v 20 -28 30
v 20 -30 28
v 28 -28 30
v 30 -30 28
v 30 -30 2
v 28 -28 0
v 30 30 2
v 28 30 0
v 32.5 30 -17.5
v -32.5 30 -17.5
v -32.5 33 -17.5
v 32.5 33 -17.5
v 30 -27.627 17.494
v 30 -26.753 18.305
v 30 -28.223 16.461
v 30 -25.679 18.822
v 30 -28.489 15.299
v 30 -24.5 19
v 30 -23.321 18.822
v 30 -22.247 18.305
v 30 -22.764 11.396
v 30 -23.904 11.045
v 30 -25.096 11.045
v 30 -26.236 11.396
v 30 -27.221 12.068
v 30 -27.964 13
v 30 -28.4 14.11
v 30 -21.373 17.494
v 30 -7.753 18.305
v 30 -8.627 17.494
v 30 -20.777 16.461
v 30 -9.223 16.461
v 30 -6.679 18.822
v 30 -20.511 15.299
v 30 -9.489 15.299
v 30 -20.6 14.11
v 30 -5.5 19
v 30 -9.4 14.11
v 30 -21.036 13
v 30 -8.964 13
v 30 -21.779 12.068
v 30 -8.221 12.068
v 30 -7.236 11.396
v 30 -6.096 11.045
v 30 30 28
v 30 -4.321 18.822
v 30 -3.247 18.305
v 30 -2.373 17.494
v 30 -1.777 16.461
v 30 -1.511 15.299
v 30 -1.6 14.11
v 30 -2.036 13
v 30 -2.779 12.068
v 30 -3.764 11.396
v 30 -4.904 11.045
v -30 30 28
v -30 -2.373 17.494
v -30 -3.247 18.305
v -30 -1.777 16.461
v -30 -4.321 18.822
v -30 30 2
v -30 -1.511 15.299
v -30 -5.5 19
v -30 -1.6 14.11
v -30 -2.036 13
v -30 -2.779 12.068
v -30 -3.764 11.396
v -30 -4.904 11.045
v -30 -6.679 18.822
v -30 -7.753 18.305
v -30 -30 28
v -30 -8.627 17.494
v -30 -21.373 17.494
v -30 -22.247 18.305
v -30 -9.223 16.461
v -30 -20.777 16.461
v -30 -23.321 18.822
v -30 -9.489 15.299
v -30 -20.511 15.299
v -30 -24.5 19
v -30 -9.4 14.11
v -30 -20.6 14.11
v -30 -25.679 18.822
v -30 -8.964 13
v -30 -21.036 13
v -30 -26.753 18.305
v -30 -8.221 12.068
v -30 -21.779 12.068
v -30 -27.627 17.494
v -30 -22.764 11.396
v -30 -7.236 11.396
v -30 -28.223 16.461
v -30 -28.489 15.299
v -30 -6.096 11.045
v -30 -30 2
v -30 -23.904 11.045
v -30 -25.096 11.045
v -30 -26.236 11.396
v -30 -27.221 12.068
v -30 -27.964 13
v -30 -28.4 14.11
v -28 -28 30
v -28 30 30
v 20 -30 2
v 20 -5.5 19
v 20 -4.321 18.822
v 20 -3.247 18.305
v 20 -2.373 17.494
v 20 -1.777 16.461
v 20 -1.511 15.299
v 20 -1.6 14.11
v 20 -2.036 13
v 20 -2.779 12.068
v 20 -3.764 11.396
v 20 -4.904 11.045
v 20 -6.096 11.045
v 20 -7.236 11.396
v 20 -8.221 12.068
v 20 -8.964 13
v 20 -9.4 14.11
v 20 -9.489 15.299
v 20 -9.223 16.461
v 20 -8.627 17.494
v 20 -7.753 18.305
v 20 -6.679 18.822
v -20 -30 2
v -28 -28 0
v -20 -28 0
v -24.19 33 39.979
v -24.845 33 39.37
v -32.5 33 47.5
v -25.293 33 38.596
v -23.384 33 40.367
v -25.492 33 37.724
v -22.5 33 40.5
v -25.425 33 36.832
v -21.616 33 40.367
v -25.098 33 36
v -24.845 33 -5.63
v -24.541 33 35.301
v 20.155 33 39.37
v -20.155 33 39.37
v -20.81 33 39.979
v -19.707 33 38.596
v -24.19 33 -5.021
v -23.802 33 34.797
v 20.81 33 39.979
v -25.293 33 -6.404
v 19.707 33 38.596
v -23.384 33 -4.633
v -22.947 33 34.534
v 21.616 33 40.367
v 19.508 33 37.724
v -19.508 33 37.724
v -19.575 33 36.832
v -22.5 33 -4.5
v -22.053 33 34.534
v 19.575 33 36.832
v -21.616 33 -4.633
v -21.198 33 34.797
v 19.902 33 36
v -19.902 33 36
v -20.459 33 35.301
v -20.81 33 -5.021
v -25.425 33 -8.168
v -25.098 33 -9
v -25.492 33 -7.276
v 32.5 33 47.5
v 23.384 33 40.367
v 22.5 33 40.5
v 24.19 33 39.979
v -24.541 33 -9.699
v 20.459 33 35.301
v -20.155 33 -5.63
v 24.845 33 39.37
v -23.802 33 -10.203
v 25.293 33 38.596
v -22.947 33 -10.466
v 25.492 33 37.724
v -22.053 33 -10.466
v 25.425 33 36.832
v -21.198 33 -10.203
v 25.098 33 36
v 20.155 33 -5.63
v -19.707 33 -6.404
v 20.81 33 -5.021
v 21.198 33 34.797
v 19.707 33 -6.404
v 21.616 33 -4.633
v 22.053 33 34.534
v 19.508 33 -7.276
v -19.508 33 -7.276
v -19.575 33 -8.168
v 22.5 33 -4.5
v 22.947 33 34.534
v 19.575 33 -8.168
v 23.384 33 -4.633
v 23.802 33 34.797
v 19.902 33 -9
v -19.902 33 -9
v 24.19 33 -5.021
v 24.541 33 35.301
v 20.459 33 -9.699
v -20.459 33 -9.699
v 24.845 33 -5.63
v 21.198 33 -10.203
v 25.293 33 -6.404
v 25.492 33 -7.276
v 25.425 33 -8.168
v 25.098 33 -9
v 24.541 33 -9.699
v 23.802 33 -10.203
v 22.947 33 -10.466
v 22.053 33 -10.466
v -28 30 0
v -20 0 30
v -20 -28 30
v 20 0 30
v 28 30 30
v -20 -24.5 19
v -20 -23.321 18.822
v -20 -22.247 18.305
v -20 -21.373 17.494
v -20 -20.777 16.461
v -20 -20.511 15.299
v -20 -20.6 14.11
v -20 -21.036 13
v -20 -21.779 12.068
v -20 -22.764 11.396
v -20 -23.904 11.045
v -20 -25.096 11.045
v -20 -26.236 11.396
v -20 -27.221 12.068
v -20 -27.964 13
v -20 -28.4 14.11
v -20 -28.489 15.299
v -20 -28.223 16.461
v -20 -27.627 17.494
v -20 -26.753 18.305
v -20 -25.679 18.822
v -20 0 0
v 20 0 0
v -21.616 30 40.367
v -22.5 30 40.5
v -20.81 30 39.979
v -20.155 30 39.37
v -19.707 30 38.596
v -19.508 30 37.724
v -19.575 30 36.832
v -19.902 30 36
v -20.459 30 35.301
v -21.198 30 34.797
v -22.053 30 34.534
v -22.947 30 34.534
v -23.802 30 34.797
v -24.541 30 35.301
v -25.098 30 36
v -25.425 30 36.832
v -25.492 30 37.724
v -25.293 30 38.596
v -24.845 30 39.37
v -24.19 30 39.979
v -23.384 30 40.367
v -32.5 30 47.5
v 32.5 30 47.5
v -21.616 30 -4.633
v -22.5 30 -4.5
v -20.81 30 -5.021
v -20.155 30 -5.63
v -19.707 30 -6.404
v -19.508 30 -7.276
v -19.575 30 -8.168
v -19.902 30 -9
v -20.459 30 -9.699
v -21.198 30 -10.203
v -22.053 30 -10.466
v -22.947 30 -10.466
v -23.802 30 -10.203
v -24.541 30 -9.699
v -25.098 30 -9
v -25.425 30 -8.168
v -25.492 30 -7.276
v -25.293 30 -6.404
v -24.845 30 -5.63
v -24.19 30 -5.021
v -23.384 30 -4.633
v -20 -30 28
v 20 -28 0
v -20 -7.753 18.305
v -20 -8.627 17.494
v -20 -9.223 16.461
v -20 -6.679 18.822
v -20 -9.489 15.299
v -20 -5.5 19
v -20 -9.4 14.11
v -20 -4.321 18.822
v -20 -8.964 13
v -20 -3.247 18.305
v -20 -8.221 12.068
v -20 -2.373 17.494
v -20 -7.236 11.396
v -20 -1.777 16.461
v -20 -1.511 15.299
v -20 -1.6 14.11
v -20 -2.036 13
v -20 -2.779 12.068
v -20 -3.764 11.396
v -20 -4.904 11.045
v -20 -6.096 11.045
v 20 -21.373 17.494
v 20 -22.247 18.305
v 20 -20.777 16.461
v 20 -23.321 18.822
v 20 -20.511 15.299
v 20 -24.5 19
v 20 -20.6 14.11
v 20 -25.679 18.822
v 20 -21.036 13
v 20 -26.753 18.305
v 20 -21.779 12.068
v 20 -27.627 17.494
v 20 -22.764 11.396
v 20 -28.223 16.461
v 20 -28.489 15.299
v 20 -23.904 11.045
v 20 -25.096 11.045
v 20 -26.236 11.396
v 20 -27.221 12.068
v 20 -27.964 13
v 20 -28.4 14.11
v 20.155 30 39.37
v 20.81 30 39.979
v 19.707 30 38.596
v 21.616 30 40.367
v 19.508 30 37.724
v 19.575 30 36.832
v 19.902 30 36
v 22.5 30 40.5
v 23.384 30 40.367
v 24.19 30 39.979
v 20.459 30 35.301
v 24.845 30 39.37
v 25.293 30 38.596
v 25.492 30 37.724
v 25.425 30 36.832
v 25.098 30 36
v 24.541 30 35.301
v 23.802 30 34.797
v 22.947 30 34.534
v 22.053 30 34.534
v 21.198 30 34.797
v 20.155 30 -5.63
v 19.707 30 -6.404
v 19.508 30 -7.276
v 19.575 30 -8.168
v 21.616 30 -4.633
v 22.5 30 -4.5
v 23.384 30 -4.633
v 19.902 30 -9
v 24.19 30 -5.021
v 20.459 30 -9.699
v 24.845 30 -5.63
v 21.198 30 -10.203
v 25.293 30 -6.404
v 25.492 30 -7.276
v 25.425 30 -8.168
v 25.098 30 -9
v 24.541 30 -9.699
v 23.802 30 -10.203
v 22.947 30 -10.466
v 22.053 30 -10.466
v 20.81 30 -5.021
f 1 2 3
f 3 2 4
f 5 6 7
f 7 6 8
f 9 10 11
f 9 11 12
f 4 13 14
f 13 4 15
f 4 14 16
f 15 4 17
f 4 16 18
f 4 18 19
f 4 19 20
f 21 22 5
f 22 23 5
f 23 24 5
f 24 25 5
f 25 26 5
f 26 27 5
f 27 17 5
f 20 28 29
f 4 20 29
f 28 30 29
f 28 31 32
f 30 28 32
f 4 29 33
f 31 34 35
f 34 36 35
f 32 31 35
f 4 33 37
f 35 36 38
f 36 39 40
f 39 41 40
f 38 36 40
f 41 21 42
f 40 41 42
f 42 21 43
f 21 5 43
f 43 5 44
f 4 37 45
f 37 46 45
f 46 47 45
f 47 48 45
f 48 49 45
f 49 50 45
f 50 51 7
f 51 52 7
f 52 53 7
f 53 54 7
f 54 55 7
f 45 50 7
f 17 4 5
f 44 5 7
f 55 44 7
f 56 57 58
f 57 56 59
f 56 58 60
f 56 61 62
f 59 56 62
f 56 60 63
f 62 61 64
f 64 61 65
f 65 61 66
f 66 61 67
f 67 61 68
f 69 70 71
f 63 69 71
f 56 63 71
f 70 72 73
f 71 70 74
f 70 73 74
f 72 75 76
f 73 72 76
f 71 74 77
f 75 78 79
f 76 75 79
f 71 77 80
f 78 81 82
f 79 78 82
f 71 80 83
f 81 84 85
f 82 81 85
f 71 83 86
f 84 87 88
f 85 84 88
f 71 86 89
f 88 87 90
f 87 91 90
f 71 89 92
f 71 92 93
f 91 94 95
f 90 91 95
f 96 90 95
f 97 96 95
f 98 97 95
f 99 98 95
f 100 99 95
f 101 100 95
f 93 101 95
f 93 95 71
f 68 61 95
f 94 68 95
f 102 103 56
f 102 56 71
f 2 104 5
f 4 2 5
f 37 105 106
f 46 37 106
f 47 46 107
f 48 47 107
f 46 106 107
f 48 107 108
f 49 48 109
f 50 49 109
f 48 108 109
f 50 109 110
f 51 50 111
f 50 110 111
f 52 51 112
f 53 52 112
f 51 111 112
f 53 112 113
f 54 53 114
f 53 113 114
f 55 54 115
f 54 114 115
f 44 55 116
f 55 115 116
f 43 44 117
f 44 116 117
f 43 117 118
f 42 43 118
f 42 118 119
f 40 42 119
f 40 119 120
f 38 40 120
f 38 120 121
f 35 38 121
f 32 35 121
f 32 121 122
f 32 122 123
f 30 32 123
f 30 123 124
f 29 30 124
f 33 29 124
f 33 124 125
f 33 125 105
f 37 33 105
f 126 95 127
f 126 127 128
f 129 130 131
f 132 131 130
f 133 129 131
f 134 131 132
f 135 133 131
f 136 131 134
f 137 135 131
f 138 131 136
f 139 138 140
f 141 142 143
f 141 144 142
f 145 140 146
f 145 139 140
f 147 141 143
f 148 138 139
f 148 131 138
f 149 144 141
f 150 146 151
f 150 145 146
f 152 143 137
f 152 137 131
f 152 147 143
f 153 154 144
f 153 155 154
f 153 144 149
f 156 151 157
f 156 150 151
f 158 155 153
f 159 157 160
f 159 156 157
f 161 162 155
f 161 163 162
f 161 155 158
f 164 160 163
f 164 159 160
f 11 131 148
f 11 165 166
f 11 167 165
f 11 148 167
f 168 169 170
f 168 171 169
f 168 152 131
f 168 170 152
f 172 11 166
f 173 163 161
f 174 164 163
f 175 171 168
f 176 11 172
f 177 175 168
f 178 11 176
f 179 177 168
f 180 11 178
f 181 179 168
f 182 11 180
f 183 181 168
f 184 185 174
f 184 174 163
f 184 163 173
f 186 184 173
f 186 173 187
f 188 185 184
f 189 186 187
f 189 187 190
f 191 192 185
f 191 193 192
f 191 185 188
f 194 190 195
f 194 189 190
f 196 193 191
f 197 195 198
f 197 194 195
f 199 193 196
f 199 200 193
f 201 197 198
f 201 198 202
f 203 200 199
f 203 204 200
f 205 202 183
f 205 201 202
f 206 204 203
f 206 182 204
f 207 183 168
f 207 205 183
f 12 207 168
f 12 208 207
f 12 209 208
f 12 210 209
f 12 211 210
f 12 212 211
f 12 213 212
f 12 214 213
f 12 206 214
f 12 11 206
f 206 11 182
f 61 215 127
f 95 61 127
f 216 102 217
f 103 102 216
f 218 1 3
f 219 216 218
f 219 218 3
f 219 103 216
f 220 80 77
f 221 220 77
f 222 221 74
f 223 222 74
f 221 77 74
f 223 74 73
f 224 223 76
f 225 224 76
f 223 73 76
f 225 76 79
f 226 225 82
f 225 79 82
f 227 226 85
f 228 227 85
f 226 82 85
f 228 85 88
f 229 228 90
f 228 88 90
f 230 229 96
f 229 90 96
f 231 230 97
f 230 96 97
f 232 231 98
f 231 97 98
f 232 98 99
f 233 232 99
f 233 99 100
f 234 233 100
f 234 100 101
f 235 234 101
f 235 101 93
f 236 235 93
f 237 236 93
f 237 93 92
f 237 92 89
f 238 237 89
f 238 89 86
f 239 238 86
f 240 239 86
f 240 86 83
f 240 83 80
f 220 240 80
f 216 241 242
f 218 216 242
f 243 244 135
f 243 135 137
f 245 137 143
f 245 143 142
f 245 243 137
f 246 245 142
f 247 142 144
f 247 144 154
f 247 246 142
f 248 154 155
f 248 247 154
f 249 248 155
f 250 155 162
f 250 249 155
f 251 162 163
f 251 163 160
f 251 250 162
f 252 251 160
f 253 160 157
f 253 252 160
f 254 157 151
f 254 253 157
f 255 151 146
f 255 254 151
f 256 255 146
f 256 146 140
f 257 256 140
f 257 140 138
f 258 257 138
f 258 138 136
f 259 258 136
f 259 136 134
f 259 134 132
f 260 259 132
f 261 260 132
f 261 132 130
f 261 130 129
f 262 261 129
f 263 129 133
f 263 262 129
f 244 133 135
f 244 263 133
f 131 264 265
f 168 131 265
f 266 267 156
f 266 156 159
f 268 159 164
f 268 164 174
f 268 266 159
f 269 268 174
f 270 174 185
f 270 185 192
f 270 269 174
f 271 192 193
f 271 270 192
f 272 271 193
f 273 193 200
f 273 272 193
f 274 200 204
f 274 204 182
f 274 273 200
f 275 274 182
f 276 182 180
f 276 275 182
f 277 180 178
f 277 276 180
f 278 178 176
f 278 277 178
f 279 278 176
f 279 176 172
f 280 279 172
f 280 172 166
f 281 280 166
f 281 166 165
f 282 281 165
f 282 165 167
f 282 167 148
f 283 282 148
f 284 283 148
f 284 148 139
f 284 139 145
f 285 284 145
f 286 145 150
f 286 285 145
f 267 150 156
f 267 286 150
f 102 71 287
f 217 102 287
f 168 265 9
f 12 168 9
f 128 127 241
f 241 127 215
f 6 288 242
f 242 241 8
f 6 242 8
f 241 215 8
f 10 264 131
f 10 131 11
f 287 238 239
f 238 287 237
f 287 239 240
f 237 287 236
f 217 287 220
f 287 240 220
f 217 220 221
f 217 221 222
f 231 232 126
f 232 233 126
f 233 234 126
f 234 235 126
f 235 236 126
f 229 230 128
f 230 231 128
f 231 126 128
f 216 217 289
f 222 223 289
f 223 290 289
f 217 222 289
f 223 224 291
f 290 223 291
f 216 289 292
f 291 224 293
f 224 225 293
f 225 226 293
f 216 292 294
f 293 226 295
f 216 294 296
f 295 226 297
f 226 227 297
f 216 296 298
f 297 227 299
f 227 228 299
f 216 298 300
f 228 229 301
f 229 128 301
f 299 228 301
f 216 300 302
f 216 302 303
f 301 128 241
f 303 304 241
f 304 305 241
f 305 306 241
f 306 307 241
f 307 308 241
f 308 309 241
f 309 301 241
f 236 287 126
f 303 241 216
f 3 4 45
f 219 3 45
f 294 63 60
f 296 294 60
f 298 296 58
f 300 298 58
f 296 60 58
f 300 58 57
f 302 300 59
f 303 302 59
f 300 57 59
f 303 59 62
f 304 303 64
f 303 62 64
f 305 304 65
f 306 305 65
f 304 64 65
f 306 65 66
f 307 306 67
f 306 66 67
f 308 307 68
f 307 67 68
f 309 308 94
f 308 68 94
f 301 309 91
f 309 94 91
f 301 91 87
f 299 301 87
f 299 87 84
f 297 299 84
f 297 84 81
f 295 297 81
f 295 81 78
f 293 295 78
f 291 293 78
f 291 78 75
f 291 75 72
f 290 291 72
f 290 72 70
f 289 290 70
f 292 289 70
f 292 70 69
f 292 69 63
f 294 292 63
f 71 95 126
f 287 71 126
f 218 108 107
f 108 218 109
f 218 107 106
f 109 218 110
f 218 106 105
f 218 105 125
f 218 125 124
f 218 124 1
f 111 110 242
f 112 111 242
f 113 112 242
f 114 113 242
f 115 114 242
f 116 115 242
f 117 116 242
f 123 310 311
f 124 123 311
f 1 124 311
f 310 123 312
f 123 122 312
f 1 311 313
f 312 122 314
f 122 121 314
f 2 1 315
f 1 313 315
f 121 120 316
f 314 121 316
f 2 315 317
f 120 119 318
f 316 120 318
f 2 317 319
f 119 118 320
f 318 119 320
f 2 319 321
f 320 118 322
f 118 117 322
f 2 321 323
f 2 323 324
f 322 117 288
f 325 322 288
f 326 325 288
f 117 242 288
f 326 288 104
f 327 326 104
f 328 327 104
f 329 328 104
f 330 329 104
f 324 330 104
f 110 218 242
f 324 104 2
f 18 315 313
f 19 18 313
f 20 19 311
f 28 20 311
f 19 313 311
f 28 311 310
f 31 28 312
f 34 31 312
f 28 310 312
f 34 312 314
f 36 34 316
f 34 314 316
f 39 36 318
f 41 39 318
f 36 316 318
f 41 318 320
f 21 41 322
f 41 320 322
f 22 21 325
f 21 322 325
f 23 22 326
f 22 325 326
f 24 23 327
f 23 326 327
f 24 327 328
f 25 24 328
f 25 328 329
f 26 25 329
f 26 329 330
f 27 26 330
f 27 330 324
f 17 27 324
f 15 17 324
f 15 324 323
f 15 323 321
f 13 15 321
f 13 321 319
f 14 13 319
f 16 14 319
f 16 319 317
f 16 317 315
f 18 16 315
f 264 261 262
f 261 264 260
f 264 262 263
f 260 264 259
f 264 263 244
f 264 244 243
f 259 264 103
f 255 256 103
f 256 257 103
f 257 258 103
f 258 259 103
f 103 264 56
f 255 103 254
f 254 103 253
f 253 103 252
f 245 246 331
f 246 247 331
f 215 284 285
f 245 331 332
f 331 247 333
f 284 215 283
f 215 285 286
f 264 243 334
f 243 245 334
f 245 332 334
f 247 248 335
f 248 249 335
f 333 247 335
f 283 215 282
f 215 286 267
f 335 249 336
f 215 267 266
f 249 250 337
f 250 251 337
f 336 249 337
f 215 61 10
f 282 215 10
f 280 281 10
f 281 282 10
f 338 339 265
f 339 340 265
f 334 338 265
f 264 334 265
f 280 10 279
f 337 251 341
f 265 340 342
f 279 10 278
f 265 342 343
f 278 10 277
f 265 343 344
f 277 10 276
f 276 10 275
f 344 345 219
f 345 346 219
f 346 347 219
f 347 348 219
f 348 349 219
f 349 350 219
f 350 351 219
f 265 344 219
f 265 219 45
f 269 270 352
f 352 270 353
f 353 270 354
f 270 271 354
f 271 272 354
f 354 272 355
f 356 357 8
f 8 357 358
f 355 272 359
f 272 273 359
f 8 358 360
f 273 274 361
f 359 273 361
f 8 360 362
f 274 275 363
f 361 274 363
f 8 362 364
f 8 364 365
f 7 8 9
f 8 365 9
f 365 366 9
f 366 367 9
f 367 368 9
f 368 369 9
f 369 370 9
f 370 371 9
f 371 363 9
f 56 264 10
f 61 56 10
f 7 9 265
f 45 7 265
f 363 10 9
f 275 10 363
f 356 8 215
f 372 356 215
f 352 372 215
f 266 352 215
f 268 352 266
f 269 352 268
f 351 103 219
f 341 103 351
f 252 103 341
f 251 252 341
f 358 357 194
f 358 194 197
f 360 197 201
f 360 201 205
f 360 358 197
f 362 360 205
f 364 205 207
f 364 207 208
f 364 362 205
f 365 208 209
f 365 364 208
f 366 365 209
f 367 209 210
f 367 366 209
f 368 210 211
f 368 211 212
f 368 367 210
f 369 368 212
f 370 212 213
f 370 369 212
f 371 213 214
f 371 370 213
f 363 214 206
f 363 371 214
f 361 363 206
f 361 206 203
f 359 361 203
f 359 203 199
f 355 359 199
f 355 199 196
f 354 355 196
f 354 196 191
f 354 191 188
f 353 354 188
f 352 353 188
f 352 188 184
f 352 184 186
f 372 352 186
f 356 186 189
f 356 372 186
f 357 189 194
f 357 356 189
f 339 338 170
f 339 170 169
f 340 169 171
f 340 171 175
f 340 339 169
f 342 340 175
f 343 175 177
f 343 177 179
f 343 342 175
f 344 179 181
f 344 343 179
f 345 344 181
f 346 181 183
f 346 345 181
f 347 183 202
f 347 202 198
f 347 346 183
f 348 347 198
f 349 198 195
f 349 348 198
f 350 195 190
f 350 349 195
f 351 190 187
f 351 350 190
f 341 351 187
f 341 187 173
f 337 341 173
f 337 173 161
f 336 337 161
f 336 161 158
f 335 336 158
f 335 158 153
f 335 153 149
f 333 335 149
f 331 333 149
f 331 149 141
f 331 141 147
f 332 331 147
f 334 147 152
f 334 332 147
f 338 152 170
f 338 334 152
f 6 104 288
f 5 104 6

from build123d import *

# Parameters (mm, degrees)
EXTRUDE_1_DEPTH     = 30
SKETCH_2_R          = 4
CUT_EXTRUDE_1_DEPTH = 74.484692283
SKETCH_3_W          = 65
SKETCH_3_H          = 65
SKETCH_3_R          = 3
EXTRUDE_2_DEPTH     = 3
CHAMFER_2_SIZE      = 2


with BuildPart() as part:
    # 草图1 → 凸台-拉伸1 (new body)
    with BuildSketch(Plane.XY):
        Polygon((-30, -30), (-20, -30), (-20, 0), (20, 0), (20, -30), (30, -30), (30, 30), (-30, 30), align=None)
    extrude(amount=EXTRUDE_1_DEPTH)

    # 草图2 → 切除-拉伸1 (cut, through all)
    with BuildSketch(Plane.ZY.offset(30)):
        with Locations((15, -5.5)):
            Circle(SKETCH_2_R)
        with Locations((15, -24.5)):
            Circle(SKETCH_2_R)
    extrude(amount=-CUT_EXTRUDE_1_DEPTH, mode=Mode.SUBTRACT)

    # 草图3 → 凸台-拉伸2 (add)
    with BuildSketch(Plane(origin=(0, 30, 0), x_dir=(1, 0, 0), z_dir=(0, 1, 0))):
        with Locations((0, -15)):
            Rectangle(SKETCH_3_W, SKETCH_3_H)
        with Locations(Location((22.5, -37.5, 0), (0, 0, 270))):
            Circle(SKETCH_3_R, mode=Mode.SUBTRACT)
        with Locations(Location((-22.5, -37.5, 0), (0, 0, 270))):
            Circle(SKETCH_3_R, mode=Mode.SUBTRACT)
        with Locations(Location((-22.5, 7.5, 0), (0, 0, 270))):
            Circle(SKETCH_3_R, mode=Mode.SUBTRACT)
        with Locations(Location((22.5, 7.5, 0), (0, 0, 270))):
            Circle(SKETCH_3_R, mode=Mode.SUBTRACT)
    extrude(amount=EXTRUDE_2_DEPTH)

    # 倒角2
    chamfer_2_edges = [part.edges().sort_by_distance(p)[0] for p in [
        (-25, -30, 0),
        (-30, 0, 0),
        (25, -30, 30),
        (30, 0, 30),
        (-30, 0, 30),
        (-25, -30, 30),
        (30, 0, 0),
        (25, -30, 0),
    ]]
    chamfer(chamfer_2_edges, length=CHAMFER_2_SIZE)


solid = part.part
